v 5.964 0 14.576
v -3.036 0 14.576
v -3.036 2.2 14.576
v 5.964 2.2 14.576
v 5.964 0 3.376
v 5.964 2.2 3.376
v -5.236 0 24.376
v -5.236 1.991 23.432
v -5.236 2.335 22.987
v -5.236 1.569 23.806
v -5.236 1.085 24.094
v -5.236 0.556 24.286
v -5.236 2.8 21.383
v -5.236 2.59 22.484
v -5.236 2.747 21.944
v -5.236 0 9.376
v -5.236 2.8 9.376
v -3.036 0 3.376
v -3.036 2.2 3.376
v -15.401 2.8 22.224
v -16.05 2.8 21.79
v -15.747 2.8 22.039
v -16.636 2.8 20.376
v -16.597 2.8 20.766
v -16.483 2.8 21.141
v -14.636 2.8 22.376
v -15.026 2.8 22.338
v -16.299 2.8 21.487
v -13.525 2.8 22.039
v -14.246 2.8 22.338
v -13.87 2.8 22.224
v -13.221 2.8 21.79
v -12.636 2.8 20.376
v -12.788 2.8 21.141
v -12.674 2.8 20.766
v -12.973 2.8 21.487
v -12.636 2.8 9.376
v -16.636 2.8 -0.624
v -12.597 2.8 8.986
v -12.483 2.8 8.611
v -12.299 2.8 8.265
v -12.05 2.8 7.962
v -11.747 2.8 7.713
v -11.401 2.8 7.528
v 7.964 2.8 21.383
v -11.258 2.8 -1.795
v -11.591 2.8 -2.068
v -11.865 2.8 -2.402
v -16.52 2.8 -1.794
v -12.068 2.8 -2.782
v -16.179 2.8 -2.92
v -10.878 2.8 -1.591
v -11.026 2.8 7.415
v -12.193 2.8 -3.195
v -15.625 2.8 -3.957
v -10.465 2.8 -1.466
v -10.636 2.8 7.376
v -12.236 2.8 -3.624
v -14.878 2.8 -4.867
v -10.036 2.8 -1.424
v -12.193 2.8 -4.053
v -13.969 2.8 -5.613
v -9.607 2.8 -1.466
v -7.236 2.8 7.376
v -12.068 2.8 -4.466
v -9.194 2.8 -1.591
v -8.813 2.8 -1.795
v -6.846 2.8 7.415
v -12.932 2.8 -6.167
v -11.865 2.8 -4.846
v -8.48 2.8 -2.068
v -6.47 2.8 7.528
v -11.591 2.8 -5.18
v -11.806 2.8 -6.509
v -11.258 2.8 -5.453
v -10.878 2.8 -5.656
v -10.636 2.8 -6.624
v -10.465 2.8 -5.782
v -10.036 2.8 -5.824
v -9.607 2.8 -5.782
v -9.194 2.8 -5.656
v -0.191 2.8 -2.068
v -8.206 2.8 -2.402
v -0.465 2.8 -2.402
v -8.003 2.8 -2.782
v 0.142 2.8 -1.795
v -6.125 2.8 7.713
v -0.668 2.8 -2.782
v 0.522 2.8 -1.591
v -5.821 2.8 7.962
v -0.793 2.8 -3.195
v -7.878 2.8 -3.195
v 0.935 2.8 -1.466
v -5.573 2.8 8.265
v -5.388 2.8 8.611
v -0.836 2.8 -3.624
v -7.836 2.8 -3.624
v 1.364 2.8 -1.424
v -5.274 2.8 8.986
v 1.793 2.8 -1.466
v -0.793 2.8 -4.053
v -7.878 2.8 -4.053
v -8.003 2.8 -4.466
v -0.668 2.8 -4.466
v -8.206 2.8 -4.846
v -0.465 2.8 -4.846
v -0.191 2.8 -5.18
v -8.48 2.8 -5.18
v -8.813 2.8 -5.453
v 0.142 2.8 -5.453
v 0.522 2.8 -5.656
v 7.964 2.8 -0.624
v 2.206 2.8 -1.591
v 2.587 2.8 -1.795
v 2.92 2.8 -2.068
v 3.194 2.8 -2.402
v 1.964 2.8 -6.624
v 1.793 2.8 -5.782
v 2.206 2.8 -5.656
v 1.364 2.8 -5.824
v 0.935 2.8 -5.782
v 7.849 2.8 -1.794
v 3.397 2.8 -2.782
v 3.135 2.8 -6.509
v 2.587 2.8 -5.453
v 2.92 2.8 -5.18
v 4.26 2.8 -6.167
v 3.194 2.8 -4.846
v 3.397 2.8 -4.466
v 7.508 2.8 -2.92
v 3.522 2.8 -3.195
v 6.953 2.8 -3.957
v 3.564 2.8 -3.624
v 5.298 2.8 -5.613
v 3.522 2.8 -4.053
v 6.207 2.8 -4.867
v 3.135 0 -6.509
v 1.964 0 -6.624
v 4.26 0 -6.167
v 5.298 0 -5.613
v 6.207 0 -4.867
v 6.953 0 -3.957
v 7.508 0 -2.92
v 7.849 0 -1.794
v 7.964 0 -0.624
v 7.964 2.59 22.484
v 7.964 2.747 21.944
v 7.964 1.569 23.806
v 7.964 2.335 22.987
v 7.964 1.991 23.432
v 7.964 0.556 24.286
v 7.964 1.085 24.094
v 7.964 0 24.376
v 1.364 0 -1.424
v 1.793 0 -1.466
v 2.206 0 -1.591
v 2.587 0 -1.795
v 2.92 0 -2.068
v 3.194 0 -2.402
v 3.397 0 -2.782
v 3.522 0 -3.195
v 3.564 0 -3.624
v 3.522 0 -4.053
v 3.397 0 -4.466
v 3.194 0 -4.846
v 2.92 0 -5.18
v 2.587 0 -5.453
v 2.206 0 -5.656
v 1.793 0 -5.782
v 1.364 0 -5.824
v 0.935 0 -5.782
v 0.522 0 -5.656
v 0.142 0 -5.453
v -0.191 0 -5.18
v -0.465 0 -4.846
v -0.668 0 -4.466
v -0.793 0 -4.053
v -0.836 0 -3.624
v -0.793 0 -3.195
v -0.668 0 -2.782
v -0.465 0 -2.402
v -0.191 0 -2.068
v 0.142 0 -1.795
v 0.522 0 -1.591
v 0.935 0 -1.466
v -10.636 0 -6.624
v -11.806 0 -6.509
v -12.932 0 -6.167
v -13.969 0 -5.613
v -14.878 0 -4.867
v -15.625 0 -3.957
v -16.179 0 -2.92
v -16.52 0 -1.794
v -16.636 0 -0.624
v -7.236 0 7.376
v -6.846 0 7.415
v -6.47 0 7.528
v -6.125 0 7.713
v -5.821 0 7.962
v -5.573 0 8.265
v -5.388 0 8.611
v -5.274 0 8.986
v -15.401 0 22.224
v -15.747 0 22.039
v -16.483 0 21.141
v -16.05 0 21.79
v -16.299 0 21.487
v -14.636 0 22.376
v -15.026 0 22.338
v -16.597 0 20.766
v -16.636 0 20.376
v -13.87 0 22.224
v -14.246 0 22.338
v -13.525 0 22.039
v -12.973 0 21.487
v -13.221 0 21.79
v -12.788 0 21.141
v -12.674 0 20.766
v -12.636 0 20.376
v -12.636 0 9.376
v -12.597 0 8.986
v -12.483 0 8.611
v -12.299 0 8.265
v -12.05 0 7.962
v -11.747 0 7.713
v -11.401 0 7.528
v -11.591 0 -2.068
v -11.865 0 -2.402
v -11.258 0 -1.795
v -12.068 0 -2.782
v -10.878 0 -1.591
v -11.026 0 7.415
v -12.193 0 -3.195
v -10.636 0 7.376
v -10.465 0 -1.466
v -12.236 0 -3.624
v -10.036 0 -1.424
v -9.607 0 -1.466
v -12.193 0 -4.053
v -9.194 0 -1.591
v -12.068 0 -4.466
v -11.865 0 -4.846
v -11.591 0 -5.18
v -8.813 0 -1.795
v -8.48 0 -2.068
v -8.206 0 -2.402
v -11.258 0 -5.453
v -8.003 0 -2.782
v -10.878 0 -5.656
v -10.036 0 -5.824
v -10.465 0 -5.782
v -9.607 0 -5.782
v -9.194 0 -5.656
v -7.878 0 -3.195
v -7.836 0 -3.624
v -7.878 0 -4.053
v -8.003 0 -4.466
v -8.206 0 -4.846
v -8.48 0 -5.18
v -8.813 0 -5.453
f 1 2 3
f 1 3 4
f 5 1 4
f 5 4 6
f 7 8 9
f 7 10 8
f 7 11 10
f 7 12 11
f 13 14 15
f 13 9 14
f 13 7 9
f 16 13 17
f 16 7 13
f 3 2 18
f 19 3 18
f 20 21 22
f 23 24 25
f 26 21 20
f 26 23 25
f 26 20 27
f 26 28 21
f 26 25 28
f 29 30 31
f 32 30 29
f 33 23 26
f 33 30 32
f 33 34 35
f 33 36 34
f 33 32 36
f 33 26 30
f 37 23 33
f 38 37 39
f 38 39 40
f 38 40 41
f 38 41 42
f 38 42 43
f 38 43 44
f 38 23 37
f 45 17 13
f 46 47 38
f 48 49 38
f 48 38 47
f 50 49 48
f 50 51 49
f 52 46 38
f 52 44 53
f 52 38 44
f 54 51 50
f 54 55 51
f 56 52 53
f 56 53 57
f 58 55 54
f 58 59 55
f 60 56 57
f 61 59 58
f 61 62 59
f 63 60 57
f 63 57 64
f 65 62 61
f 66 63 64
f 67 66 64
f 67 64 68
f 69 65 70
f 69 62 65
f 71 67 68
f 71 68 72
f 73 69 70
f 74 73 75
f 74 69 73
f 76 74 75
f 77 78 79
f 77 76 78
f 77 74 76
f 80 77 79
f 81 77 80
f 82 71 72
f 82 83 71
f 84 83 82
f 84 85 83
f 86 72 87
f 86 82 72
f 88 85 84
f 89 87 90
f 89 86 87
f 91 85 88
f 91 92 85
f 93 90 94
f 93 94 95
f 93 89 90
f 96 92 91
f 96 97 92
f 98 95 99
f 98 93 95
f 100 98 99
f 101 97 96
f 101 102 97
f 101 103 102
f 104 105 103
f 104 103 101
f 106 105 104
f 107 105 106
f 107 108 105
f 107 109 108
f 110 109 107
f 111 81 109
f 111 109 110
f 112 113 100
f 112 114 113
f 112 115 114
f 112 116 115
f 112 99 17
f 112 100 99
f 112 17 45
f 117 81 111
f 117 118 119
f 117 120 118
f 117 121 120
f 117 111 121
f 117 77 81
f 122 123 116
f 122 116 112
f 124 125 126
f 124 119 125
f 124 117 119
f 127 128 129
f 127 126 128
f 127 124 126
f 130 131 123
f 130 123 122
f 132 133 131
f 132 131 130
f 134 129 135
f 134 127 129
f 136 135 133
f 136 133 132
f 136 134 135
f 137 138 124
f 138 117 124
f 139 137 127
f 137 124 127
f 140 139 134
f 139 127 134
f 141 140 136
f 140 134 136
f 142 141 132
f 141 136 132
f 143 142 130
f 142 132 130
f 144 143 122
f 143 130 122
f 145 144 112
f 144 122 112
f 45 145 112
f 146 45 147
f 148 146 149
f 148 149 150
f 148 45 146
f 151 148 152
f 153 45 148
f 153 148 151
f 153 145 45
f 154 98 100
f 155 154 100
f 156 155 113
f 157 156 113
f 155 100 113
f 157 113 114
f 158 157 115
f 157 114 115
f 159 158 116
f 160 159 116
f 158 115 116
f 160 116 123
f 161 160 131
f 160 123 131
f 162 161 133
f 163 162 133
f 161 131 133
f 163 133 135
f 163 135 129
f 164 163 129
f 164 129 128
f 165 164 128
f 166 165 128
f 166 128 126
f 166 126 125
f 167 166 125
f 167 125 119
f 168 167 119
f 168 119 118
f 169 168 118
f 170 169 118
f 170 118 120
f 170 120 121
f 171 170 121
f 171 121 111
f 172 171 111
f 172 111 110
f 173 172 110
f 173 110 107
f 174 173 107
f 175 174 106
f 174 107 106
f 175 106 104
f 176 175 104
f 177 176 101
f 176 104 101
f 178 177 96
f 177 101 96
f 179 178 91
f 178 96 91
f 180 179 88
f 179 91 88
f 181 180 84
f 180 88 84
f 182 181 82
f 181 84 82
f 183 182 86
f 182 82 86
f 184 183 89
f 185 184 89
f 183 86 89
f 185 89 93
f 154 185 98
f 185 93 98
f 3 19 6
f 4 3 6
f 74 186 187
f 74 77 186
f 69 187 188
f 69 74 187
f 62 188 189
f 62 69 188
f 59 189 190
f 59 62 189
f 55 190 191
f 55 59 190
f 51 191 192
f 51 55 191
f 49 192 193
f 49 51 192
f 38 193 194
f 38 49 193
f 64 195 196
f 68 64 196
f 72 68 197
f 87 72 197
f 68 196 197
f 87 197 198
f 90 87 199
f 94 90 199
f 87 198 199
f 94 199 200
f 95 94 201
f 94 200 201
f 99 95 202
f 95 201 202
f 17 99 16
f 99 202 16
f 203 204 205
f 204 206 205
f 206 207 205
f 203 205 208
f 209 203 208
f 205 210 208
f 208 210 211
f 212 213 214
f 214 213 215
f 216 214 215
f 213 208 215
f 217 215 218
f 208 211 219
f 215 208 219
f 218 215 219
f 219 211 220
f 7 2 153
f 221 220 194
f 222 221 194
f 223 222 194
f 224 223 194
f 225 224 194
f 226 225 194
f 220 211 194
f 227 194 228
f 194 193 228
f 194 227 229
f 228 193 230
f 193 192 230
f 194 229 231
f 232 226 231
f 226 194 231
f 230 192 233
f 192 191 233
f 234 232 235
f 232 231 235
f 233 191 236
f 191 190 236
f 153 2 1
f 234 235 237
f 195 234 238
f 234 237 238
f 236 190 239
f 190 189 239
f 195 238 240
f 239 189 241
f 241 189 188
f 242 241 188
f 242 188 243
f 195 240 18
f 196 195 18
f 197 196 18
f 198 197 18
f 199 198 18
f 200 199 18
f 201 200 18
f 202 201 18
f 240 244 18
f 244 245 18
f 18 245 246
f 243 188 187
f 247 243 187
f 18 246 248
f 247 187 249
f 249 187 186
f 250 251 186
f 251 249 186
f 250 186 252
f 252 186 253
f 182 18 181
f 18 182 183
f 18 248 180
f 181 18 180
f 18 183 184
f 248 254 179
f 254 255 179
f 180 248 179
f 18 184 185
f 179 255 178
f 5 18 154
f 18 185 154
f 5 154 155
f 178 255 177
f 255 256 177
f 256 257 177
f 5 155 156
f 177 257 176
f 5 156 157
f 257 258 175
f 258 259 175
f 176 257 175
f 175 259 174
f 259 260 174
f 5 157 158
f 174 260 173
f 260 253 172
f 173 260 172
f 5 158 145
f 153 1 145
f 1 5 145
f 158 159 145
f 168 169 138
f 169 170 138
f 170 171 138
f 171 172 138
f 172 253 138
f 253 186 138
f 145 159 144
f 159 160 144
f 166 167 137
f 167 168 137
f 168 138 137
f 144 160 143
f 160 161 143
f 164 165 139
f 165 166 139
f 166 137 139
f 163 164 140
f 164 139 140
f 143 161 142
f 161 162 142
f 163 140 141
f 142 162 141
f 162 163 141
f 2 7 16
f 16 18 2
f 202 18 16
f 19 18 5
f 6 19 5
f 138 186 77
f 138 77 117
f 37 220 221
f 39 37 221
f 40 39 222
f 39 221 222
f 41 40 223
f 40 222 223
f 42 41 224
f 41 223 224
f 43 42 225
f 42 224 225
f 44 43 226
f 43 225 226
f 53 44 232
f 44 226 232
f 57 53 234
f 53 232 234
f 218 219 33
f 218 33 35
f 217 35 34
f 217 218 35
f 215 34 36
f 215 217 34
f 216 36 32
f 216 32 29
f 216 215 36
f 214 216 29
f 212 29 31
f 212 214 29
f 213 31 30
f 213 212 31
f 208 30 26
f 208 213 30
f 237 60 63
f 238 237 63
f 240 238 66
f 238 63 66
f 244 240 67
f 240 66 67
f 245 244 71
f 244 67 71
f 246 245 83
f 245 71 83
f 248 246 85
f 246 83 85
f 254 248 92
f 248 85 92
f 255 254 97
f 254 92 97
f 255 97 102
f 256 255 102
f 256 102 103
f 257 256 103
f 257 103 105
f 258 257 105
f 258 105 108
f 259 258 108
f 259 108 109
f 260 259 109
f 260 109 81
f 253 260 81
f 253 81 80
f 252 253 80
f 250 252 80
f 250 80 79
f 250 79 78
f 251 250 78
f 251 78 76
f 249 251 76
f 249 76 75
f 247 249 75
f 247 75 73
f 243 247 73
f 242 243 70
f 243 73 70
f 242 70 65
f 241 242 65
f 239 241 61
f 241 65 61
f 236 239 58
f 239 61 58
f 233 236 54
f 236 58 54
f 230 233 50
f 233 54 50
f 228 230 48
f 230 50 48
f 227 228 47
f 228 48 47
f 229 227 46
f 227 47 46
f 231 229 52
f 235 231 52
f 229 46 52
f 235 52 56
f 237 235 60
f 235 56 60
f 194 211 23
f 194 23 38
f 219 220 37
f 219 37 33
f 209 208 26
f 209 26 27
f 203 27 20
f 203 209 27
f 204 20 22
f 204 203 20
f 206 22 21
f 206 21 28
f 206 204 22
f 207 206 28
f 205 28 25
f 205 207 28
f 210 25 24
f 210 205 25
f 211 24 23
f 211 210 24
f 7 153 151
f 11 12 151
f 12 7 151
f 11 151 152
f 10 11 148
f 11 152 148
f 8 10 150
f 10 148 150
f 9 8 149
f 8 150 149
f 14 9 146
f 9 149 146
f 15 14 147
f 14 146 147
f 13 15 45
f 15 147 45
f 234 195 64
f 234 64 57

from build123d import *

# Parameters (mm, degrees)
BOSS_EXTRUDE1_DEPTH = 2.8
SKETCH4_R           = 2.2
CUT_EXTRUDE3_DEPTH  = 6
FILLET1_R           = 6
FILLET2_START       = -1
FILLET2_DEPTH       = 5
FILLET2_2_DEPTH     = 2.8
CUT_EXTRUDE7_START  = -2.8
SKETCH7_W           = 9
SKETCH7_H           = 11.2
CUT_EXTRUDE7_DEPTH  = 2.2
FILLET5_R           = 3


with BuildPart() as part:
    # Sketch1 → Boss-Extrude1 (new body)
    with BuildSketch(Plane(origin=(0, 0, 0), x_dir=(1, 0, 0), z_dir=(0, 1, 0))):
        Polygon((-16.635707691, 6.623874564), (7.964292309, 6.623874564), (7.964292309, -24.376125436), (-5.235707691, -24.376125436), (-5.235707691, -7.376125436), (-12.635707691, -7.376125436), (-12.635707691, -22.376125436), (-16.635707691, -22.376125436), align=None)
    extrude(amount=BOSS_EXTRUDE1_DEPTH)

    # Sketch4 → Cut-Extrude3 (cut)
    with BuildSketch(Plane(origin=(0, 2.8, 0), x_dir=(1, 0, 0), z_dir=(0, 1, 0))):
        with Locations(Location((-10.035707691, 3.623874564, 0), (0, 0, 270))):
            Circle(SKETCH4_R)
        with Locations(Location((1.364292309, 3.623874564, 0), (0, 0, 270))):
            Circle(SKETCH4_R)
    extrude(amount=-CUT_EXTRUDE3_DEPTH, mode=Mode.SUBTRACT)

    # Fillet1
    fillet1_edges = [part.edges().sort_by_distance(p)[0] for p in [
        (-16.635707691, 1.4, -6.623874564),
        (7.964292309, 1.4, -6.623874564),
    ]]
    fillet(fillet1_edges, radius=FILLET1_R)

    # Fillet2: read off the stored shape, not the designer's step
    # Fillet2 outline → Fillet2 (cut)
    with BuildSketch(Plane(origin=(0, 0, 0), x_dir=(1, 0, 0), z_dir=(0, 1, 0)).offset(FILLET2_START)):
        with BuildLine():
            Line((-16.635707691, -22.376125436), (-14.635707691, -22.376125436))
            ThreePointArc((-14.635707691, -22.376125436), (-16.049921254, -21.790338998), (-16.635707691, -20.376125436))
            Line((-16.635707691, -20.376125436), (-16.635707691, -22.376125436))
        make_face()
        with BuildLine():
            Line((-12.635707691, -22.376125436), (-12.635707691, -20.376125436))
            ThreePointArc((-12.635707691, -20.376125436), (-13.221494128, -21.790338999), (-14.635707691, -22.376125436))
            Line((-14.635707691, -22.376125436), (-12.635707691, -22.376125436))
        make_face()
    extrude(amount=FILLET2_DEPTH, mode=Mode.SUBTRACT)

    # Fillet2 2 outline → Fillet2 2 (add)
    with BuildSketch(Plane(origin=(0, 0, 0), x_dir=(1, 0, 0), z_dir=(0, 1, 0))):
        with BuildLine():
            ThreePointArc((-12.635707691, -9.376125436), (-12.049921253, -7.961911874), (-10.635707691, -7.376125436))
            Line((-10.635707691, -7.376125436), (-12.635707691, -7.376125436))
            Line((-12.635707691, -7.376125436), (-12.635707691, -9.376125436))
        make_face()
        with BuildLine():
            ThreePointArc((-7.235707691, -7.376125436), (-5.821494128, -7.961911874), (-5.235707691, -9.376125436))
            Line((-5.235707691, -9.376125436), (-5.235707691, -7.376125436))
            Line((-5.235707691, -7.376125436), (-7.235707691, -7.376125436))
        make_face()
    extrude(amount=FILLET2_2_DEPTH)

    # Sketch7 → Cut-Extrude7 (cut)
    with BuildSketch(Plane(origin=(0, 2.8, 0), x_dir=(1, 0, 0), z_dir=(0, 1, 0)).offset(CUT_EXTRUDE7_START)):
        with Locations((1.464292309, -8.976125436)):
            Rectangle(SKETCH7_W, SKETCH7_H)
    extrude(amount=CUT_EXTRUDE7_DEPTH, mode=Mode.SUBTRACT)

    # Fillet5
    # the kernel refuses this fillet: 3 mm, written as the material it takes off along each edge
    with BuildSketch(Plane(origin=(15.447607083, 2.8, 24.376125436), x_dir=(0, 0, -1), z_dir=(-1, 0, 0))) as fillet5_piece_1:
        with BuildLine():
            CenterArc((2.993325909, 3), FILLET5_R, 183.822553729, 86.177446271)
            Line((0, 2.8), (-0.059866518, 2.796))
            ThreePointArc((-0.059866518, 2.796), (-0.06, 1.4), (-0.06, 0))
            Line((-0.06, 0), (0, -0.06))
            Line((0, -0.06), (2.993325909, -0.06))
            Line((2.993325909, -0.06), (2.993325909, 0))
        make_face()
    extrude(amount=28.166629547, mode=Mode.SUBTRACT)


solid = part.part
